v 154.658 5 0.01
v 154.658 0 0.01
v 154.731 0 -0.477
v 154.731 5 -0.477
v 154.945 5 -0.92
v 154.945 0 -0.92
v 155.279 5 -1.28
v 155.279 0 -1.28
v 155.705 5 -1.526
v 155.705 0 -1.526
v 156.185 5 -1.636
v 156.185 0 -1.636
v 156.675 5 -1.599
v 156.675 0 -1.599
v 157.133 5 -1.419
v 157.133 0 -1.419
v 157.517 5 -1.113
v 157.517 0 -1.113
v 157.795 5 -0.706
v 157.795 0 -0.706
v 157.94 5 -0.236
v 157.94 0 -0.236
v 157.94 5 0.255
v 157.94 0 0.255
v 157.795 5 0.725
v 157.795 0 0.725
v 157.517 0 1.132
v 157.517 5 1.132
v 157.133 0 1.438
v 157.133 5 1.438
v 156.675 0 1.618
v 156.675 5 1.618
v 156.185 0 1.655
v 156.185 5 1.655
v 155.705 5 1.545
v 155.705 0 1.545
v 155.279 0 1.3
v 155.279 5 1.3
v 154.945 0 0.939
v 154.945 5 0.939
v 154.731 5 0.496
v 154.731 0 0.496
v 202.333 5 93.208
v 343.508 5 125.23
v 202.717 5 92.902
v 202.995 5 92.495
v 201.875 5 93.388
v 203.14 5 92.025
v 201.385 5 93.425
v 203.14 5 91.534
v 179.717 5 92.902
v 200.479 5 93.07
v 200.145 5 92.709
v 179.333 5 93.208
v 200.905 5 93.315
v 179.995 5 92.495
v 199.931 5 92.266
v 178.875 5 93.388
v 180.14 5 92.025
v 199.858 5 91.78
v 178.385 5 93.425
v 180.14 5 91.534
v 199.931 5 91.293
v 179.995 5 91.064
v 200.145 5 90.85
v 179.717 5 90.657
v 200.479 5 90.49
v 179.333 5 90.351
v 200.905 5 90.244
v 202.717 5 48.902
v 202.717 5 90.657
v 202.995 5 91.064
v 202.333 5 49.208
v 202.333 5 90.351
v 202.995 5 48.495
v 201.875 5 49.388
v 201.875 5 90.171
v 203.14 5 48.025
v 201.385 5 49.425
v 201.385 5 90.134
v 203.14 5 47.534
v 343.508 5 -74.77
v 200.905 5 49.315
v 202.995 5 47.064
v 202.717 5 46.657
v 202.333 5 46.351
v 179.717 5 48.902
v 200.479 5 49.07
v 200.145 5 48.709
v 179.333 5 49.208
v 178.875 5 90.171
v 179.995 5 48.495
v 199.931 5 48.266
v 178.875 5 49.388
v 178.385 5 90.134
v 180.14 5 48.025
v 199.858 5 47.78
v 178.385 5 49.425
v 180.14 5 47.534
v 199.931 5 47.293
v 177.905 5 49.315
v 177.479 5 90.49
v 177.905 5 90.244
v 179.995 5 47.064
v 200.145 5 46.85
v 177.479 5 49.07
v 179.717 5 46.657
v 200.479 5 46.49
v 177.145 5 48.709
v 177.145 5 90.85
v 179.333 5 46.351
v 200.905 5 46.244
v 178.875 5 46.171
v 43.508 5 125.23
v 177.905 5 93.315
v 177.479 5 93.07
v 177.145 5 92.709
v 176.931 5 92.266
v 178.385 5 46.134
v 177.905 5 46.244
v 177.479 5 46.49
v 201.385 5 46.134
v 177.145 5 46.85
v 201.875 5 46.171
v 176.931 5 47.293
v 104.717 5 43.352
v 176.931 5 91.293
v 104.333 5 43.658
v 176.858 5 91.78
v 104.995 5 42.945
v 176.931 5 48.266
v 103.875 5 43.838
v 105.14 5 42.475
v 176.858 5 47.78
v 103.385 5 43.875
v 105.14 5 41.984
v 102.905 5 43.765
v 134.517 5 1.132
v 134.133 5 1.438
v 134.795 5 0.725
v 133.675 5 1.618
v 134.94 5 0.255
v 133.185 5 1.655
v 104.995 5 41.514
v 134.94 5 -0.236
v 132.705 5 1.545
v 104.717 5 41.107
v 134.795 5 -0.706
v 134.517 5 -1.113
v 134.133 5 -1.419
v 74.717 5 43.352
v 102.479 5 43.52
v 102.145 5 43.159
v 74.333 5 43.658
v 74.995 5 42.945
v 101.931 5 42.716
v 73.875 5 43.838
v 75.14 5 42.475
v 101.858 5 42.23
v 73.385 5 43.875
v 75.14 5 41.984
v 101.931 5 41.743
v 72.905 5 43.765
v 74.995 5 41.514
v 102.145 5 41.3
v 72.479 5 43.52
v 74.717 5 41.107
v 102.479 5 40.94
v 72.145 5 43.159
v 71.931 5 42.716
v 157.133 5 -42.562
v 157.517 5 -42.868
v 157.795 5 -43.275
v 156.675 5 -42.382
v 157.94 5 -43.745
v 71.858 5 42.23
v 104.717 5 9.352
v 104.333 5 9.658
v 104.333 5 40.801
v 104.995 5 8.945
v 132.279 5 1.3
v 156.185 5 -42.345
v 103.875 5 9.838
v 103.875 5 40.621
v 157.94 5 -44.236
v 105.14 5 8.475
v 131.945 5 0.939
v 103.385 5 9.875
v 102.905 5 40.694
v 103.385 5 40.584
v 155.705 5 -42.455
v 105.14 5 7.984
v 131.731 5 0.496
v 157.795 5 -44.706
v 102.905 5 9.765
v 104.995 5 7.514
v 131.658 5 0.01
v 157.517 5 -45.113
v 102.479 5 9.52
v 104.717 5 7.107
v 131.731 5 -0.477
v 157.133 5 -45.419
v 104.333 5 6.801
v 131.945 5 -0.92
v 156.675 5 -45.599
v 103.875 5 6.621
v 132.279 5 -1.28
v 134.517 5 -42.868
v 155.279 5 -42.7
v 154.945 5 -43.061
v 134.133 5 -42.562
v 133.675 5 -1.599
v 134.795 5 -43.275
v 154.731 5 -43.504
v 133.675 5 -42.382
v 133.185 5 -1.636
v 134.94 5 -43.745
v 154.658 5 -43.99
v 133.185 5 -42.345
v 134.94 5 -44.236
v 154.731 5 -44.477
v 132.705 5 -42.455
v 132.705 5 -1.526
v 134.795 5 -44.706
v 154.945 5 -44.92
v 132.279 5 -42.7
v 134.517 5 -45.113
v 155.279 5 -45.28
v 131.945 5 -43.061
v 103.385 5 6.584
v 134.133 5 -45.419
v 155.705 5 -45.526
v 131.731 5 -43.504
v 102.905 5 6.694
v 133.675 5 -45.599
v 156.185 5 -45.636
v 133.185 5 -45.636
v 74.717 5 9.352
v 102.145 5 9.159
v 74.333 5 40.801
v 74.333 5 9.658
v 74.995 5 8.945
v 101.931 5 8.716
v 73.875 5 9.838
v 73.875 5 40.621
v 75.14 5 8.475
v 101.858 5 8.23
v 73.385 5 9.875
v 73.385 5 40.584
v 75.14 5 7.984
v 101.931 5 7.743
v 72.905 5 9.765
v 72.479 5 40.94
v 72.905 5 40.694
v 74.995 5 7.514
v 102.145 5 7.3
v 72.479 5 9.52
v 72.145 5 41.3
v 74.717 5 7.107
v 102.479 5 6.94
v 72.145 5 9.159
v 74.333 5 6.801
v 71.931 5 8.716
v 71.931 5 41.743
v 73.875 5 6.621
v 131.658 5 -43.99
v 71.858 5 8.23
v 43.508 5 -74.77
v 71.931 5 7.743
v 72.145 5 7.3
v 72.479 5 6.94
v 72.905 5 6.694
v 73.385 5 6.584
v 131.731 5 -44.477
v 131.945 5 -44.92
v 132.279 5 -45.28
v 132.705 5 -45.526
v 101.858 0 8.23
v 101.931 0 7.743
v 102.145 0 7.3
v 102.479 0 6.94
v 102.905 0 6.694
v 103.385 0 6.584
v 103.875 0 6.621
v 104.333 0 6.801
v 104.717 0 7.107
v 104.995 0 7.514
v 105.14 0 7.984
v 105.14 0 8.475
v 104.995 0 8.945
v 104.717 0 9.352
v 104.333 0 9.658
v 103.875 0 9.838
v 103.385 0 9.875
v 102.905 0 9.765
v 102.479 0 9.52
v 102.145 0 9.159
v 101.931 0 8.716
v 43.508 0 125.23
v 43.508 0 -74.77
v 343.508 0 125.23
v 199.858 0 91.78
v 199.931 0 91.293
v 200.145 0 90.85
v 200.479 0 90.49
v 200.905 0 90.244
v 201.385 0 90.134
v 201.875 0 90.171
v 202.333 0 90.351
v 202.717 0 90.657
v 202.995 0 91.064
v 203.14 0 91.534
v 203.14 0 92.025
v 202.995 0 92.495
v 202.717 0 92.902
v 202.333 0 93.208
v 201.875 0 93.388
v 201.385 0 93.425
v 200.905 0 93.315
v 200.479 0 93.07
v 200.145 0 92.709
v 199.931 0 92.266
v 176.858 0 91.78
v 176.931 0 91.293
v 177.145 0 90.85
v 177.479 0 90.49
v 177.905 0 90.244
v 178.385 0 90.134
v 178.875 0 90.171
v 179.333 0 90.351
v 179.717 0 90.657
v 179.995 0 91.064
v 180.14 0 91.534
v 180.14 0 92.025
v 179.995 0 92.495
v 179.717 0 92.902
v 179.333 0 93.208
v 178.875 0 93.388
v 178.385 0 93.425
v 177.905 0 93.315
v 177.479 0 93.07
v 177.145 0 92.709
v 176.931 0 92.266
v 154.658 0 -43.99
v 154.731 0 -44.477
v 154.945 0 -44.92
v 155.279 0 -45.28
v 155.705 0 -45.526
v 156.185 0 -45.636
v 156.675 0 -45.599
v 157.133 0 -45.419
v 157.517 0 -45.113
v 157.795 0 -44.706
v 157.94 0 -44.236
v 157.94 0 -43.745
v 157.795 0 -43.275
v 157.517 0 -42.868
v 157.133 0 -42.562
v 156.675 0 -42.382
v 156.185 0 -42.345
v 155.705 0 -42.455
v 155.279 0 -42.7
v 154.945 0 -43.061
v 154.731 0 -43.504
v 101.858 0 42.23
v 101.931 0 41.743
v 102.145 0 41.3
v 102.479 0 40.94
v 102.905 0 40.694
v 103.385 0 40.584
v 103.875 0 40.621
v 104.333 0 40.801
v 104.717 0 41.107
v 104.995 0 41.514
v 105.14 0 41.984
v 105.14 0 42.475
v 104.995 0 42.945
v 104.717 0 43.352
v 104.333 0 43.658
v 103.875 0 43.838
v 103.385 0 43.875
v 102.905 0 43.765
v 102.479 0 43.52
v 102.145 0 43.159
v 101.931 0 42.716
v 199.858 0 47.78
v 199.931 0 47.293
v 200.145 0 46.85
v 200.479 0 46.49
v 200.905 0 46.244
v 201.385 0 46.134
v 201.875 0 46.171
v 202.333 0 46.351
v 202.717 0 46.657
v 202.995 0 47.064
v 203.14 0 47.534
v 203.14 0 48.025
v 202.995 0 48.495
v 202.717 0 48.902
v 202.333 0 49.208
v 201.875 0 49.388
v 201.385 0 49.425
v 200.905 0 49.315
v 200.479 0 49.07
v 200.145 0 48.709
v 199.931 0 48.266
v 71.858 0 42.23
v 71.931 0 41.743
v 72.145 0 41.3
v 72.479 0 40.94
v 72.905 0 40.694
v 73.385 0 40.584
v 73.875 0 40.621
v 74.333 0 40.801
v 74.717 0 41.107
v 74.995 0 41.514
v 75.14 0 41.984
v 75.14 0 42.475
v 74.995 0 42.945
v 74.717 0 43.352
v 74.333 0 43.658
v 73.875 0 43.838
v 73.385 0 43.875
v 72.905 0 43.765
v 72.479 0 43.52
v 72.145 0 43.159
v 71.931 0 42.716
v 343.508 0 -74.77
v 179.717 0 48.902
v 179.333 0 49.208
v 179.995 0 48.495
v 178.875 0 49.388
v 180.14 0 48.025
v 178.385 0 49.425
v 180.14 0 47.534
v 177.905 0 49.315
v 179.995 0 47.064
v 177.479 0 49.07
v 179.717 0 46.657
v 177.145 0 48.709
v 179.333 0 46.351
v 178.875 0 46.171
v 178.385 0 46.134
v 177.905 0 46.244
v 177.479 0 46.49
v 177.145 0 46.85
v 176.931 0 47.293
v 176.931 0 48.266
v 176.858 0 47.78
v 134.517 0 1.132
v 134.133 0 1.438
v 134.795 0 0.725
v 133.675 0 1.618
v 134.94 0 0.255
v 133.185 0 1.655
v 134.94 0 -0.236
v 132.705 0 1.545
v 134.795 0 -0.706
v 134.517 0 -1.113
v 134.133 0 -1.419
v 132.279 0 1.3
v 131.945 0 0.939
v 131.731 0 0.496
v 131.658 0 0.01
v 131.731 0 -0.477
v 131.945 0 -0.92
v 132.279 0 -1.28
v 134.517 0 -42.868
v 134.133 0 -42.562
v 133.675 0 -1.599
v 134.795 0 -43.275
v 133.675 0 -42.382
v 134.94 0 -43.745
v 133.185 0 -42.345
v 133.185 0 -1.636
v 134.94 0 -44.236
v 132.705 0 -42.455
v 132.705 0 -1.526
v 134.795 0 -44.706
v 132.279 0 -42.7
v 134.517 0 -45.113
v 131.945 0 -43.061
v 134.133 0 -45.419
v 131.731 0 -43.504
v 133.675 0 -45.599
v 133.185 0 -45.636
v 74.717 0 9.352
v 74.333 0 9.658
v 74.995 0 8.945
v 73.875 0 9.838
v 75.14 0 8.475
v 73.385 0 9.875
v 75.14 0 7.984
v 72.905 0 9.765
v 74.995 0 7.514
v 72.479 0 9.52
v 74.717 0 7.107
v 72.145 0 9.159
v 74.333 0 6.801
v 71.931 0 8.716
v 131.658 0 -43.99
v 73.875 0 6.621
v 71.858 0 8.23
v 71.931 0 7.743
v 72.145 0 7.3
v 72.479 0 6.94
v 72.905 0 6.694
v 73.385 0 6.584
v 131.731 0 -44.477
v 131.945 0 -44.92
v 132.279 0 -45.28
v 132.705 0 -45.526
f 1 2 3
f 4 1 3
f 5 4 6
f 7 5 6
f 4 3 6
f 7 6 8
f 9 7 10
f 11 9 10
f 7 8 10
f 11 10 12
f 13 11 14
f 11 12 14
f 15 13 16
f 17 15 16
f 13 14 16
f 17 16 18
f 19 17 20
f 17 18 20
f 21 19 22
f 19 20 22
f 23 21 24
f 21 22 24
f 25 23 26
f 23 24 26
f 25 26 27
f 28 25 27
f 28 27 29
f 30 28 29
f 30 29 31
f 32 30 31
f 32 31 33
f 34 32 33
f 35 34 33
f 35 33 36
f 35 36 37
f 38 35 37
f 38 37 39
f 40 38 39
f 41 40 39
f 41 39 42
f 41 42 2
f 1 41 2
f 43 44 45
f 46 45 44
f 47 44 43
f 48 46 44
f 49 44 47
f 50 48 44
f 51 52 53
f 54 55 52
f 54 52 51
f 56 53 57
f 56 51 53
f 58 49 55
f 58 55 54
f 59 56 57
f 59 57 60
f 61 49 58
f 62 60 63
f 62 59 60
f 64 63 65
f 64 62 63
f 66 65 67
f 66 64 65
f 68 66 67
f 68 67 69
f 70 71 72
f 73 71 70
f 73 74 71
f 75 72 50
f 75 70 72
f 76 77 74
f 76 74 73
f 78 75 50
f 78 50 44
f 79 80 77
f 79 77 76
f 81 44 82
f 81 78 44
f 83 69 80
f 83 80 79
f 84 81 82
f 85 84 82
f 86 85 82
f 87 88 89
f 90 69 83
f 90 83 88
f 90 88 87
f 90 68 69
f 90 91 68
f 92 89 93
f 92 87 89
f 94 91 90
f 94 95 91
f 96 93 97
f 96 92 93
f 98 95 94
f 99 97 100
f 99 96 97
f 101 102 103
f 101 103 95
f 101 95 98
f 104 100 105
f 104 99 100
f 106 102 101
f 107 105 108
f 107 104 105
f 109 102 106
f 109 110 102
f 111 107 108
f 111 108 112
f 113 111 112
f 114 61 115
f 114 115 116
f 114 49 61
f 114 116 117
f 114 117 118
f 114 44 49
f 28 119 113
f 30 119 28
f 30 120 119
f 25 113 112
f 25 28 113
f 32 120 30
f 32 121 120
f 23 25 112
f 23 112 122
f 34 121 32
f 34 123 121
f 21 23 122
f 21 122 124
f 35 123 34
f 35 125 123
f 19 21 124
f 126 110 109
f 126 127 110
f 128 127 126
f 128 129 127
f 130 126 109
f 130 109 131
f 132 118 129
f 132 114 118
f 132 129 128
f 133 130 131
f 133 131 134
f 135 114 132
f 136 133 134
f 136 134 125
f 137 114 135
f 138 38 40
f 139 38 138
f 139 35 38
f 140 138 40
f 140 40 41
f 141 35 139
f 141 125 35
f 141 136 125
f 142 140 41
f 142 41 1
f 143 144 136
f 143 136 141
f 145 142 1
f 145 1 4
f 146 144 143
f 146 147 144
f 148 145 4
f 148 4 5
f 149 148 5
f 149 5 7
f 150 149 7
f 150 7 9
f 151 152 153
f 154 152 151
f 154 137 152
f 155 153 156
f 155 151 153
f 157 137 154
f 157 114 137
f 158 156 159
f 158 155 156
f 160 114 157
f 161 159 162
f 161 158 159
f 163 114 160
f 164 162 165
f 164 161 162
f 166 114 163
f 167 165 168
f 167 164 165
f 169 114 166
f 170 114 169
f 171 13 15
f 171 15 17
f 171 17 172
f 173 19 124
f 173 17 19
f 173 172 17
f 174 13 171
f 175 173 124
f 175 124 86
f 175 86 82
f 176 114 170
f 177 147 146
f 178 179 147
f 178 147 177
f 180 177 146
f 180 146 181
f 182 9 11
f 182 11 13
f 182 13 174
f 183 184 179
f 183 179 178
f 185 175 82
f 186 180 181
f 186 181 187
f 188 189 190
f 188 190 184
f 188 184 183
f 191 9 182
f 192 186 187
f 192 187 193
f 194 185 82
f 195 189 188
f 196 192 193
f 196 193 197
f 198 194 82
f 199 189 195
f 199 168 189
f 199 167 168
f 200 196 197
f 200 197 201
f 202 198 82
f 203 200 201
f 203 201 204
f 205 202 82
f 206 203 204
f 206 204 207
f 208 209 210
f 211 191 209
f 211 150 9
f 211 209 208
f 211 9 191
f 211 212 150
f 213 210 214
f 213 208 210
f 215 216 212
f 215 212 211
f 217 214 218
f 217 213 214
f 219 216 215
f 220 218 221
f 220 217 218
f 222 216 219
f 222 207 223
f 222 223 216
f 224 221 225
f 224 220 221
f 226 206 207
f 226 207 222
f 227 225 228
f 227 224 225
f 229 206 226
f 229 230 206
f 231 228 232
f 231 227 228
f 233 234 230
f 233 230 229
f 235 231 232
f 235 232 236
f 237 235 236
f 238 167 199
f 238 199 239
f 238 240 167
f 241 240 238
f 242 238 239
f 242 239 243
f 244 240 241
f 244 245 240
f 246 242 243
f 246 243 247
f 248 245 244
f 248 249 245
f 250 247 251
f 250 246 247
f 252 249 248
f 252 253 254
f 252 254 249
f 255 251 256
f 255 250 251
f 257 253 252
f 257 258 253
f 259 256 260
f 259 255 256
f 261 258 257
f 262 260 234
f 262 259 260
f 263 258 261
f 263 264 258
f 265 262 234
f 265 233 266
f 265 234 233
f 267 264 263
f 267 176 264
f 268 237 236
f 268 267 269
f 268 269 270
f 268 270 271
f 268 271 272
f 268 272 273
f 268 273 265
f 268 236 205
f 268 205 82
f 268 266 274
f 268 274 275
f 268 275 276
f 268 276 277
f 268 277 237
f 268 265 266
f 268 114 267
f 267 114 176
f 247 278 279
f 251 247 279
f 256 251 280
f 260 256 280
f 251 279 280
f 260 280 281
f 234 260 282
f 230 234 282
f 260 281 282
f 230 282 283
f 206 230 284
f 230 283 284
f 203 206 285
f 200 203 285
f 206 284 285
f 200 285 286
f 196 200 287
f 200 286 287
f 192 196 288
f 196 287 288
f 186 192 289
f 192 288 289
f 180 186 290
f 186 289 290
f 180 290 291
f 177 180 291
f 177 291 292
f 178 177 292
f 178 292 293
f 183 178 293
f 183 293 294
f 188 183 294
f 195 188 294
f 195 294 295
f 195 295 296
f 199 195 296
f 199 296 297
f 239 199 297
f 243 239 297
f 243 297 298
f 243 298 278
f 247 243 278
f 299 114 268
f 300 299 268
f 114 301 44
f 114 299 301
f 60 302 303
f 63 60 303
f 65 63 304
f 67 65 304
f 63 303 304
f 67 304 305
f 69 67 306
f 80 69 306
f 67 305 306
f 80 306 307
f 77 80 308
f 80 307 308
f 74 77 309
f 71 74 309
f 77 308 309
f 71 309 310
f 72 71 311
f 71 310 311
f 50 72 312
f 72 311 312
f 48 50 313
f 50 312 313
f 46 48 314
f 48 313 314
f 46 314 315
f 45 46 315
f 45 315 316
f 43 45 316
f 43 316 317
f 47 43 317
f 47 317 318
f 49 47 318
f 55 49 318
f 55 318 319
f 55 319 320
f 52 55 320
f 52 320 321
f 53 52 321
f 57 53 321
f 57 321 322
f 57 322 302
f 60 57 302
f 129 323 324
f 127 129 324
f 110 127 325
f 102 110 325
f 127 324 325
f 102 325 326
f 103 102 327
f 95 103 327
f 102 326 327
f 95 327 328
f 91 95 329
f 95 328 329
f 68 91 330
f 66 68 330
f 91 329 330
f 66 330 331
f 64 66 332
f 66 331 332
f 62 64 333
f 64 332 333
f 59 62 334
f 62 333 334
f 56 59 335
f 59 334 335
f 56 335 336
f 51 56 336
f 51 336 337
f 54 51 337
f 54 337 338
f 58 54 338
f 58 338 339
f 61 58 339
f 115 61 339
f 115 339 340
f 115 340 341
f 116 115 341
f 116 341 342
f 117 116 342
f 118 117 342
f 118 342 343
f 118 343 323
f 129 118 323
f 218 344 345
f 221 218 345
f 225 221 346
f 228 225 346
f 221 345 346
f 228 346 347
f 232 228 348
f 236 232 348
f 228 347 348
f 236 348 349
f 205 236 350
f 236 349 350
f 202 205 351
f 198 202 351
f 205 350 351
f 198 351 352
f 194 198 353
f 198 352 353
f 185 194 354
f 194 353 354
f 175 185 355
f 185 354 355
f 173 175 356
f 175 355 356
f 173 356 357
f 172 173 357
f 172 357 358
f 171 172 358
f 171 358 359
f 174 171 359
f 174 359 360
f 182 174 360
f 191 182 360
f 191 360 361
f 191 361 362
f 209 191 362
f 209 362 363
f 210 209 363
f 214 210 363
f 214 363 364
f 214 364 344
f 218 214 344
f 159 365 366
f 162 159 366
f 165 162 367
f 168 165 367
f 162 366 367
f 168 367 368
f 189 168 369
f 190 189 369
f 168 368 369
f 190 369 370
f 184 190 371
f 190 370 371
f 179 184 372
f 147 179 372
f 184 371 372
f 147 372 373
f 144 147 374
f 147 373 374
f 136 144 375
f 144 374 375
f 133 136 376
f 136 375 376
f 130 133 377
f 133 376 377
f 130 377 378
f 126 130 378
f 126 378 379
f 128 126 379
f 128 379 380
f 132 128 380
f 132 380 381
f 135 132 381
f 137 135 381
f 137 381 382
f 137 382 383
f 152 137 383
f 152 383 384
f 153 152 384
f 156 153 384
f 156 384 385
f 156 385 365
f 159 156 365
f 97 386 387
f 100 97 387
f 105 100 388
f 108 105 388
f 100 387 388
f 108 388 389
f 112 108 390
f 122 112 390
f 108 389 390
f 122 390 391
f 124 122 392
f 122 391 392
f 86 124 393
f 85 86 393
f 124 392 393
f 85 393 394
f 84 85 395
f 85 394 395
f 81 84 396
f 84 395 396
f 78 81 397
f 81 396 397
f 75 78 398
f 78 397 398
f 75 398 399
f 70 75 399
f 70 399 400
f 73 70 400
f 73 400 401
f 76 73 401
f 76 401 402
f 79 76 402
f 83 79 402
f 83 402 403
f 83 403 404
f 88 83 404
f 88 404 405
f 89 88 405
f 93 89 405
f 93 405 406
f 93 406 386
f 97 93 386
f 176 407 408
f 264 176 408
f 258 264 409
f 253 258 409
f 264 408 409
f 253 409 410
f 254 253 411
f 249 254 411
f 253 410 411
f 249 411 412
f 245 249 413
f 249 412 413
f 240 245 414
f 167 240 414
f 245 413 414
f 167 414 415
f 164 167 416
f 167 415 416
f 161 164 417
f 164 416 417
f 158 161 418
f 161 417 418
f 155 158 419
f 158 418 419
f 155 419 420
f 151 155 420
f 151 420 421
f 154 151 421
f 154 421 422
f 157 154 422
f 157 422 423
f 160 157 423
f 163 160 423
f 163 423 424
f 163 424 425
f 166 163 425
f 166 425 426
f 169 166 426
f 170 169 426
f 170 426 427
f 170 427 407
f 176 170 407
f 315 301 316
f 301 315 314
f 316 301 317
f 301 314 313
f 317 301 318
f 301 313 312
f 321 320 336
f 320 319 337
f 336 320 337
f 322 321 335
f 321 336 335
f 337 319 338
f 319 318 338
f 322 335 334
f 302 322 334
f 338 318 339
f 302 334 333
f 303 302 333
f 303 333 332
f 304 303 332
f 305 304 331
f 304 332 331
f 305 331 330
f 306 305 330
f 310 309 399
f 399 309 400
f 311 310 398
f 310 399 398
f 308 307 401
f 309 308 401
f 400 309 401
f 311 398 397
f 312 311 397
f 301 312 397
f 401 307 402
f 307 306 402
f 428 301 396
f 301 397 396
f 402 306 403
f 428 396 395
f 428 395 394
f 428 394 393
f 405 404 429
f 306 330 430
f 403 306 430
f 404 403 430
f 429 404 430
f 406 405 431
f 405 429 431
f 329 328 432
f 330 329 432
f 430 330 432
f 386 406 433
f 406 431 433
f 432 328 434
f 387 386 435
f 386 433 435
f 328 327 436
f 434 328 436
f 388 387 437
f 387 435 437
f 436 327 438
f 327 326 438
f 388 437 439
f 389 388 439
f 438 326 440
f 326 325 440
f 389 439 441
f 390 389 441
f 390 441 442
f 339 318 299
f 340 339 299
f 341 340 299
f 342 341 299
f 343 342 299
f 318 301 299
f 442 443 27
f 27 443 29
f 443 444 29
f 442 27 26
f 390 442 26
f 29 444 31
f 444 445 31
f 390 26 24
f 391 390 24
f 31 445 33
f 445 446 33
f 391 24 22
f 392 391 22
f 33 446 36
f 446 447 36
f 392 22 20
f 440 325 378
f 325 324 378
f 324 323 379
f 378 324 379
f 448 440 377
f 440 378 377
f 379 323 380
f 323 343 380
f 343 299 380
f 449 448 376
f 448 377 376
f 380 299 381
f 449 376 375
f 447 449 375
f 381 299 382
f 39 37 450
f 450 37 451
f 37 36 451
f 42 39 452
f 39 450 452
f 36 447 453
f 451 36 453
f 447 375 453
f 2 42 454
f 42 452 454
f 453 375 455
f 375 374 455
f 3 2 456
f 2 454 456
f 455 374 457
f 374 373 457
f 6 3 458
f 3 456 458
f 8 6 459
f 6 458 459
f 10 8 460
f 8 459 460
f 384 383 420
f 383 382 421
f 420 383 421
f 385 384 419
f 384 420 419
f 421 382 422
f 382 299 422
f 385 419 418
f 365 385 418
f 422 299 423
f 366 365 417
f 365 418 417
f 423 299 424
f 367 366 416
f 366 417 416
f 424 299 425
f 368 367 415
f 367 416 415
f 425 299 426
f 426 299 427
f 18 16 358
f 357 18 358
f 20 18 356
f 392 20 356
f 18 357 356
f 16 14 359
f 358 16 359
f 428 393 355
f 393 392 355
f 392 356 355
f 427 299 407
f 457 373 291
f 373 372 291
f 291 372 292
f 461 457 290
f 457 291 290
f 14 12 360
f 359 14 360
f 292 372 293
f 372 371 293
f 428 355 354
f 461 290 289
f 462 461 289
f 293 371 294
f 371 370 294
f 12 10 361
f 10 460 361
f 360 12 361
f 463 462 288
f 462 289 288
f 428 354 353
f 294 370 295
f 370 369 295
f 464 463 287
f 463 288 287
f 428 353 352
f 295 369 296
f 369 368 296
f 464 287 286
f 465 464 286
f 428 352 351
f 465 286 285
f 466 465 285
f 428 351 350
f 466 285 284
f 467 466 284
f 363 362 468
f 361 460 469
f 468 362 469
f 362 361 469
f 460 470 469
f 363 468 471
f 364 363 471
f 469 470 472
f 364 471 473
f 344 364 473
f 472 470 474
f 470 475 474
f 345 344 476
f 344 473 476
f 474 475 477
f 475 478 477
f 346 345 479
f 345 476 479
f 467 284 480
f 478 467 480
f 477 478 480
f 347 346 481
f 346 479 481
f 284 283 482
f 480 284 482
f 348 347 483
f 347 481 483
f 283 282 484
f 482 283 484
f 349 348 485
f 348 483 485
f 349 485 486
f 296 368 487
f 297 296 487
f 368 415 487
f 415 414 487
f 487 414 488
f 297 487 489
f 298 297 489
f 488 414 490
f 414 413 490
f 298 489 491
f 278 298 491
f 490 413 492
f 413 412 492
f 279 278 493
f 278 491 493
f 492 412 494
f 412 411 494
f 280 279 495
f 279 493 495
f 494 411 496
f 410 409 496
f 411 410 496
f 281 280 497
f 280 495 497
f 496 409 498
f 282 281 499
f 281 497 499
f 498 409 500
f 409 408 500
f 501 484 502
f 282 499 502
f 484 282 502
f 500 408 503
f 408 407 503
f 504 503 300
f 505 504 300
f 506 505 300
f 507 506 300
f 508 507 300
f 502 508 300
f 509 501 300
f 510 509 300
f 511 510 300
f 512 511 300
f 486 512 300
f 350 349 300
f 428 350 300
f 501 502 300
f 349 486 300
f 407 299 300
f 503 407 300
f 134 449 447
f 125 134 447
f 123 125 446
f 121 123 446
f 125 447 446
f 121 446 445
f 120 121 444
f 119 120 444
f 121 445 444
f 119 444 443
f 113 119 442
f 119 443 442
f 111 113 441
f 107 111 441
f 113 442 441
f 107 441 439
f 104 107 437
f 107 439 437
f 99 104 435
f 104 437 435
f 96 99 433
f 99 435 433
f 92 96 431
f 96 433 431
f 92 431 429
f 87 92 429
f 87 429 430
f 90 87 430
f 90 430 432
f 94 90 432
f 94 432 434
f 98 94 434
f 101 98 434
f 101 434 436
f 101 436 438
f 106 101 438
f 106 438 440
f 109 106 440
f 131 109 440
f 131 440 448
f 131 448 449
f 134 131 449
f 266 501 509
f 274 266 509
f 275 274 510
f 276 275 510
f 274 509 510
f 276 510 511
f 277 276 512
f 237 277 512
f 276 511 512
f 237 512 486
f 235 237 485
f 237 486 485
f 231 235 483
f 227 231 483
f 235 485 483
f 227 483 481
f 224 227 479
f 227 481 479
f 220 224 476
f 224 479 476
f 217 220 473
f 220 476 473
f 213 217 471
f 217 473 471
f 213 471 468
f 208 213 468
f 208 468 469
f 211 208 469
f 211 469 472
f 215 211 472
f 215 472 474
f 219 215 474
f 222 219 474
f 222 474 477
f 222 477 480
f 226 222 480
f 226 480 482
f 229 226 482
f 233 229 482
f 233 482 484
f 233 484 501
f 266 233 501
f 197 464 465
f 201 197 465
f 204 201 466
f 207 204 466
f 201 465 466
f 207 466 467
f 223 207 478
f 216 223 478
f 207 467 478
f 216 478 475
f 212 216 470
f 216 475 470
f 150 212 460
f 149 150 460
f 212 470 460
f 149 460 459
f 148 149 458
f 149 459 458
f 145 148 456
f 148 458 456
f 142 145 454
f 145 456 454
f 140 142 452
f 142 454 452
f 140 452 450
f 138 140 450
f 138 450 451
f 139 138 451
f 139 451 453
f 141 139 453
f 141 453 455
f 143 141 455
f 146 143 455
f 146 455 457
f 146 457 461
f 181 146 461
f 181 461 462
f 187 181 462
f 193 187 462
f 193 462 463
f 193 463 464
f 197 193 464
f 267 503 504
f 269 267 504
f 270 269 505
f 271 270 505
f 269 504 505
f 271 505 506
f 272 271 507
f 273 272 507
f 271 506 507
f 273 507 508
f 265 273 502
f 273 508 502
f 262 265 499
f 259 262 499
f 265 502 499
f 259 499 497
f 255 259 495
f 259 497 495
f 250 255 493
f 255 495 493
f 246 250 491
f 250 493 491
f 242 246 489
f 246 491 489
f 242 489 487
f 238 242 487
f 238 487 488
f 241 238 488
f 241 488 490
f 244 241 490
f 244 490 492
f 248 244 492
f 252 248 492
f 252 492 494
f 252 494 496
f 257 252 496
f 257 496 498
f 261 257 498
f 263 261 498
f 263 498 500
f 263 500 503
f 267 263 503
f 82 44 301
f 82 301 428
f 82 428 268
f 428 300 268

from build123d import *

# Parameters (mm, degrees)
SKETCH_2_W               = 240.549430728
SKETCH_2_H               = 149.540933388
EXTRUDE_1_DEPTH          = 5
SKETCH_6_W               = 93.246571425
SKETCH_6_H               = 149.540933388
EXTRUDE_4_DEPTH          = 5
SKETCH_8_W               = 274.716709757
SKETCH_8_H               = 58.51354913
EXTRUDE_6_DEPTH          = 5
CUT_EXTRUDE_2_DEPTH      = 252.755772101
CUT_EXTRUDE_2_DEPTH_BACK = 252.755772101
SKETCH_9_W               = 59.079292396
SKETCH_9_H               = 149.540933388
SKETCH_10_W              = 104.703380117
SKETCH_10_H              = 208.054482518
CUT_EXTRUDE_3_DEPTH      = 10
SKETCH_12_W              = 200
SKETCH_12_H              = 200
EXTRUDE_7_DEPTH          = 5
SKETCH_13_OUTSIDE_W      = 259.728
SKETCH_13_OUTSIDE_H      = 267.782
SKETCH_13_OUTSIDE_W_2    = 200
SKETCH_13_OUTSIDE_H_2    = 200
CUT_EXTRUDE_4_DEPTH      = 278.64321362
EXTRUDE_START            = -75
SKETCH_18_R              = 5.25
EXTRUDE_9_DEPTH          = 10
EXTRUDE_START_2          = -46
EXTRUDE_10_DEPTH         = 15
EXTRUDE_START_3          = -91.2
EXTRUDE_11_DEPTH         = 15
EXTRUDE_12_REACH         = 307.894
SKETCH_20_R              = 5.25
SKETCH_26_W              = 200
SKETCH_26_H              = 5
EXTRUDE_13_DEPTH         = 100
SKETCH_27_W              = 200
SKETCH_27_H              = 5
CUT_EXTRUDE_5_DEPTH      = 30
EXTRUDE_14_DEPTH         = 10
SKETCH_29_W              = 60
SKETCH_29_H              = 9
EXTRUDE_15_DEPTH         = 10
HOLE_WIZARD_M4_1_D       = 3.3
HOLE_WIZARD_M4_2_D       = 3.3
HOLE_WIZARD_M4_3_D       = 3.3
EXTRUDE_16_DEPTH         = 10
SKETCH_37_W              = 60
SKETCH_37_H              = 9
EXTRUDE_17_DEPTH         = 10
HOLE_WIZARD_M4_4_D       = 3.3
EXTRUDE_START_4          = -3.5
SKETCH_40_R              = 5.25
SKETCH_40_R_2            = 3.25
EXTRUDE_18_DEPTH         = 46.5
CUT_EXTRUDE_START        = -3.5
SKETCH_41_R              = 5.25
SKETCH_41_R_2            = 3.25
CUT_EXTRUDE_6_DEPTH      = 3.5
HOLE_WIZARD_M4_5_D       = 3.3
SKETCH_44_W              = 237.08727287
SKETCH_44_H              = 162.445626336
CUT_EXTRUDE_7_DEPTH      = 400.170489639
SKETCH_45_W              = 200
SKETCH_45_H              = 5
EXTRUDE_19_DEPTH         = 30


with BuildPart() as part:
    # 草图2 → 凸台-拉伸1 (new body)
    with BuildSketch(Plane(origin=(0, 0, 0), x_dir=(1, 0, 0), z_dir=(0, 1, 0))):
        Rectangle(SKETCH_2_W, SKETCH_2_H)
    extrude(amount=EXTRUDE_1_DEPTH)

    # 草图6 → 凸台-拉伸4 (add)
    with BuildSketch(Plane(origin=(0, 5, 0), x_dir=(1, 0, 0), z_dir=(0, 1, 0))):
        with Locations((166.898001077, 0)):
            Rectangle(SKETCH_6_W, SKETCH_6_H)
    extrude(amount=-EXTRUDE_4_DEPTH)

    # 草图8 → 凸台-拉伸6 (add)
    with BuildSketch(Plane(origin=(0, 5, 0), x_dir=(1, 0, 0), z_dir=(0, 1, 0))):
        with Locations((76.162931911, -104.027241259)):
            Rectangle(SKETCH_8_W, SKETCH_8_H)
    extrude(amount=-EXTRUDE_6_DEPTH)

    # 草图9 → 切除-拉伸2 (cut, two sides: drawn at the far end of the back side and taken through both)
    with BuildSketch(Plane(origin=(0, 5, 0), x_dir=(1, 0, 0), z_dir=(0, 1, 0)).offset(-CUT_EXTRUDE_2_DEPTH_BACK)):
        with Locations((-90.735069166, 0)):
            Rectangle(SKETCH_9_W, SKETCH_9_H)
    extrude(amount=CUT_EXTRUDE_2_DEPTH + CUT_EXTRUDE_2_DEPTH_BACK, mode=Mode.SUBTRACT)

    # 草图10 → 切除-拉伸3 (cut)
    with BuildSketch(Plane(origin=(0, 5, 0), x_dir=(1, 0, 0), z_dir=(0, 1, 0))):
        with Locations((-8.84373291, -29.256774565)):
            Rectangle(SKETCH_10_W, SKETCH_10_H)
    extrude(amount=-CUT_EXTRUDE_3_DEPTH, mode=Mode.SUBTRACT)

    # 草图12 → 凸台-拉伸7 (add)
    with BuildSketch(Plane(origin=(0, 5, 0), x_dir=(1, 0, 0), z_dir=(0, 1, 0))):
        with Locations((143.507957149, -25.229533306)):
            Rectangle(SKETCH_12_W, SKETCH_12_H)
    extrude(amount=-EXTRUDE_7_DEPTH)

    # 草图13 outside → 切除-拉伸4 (cut, through all)
    with BuildSketch(Plane(origin=(0, 5, 0), x_dir=(1, 0, 0), z_dir=(0, 1, 0))):
        with Locations((143.508, -29.257)):
            Rectangle(SKETCH_13_OUTSIDE_W, SKETCH_13_OUTSIDE_H)
        with Locations((143.507957149, -25.229533306)):
            Rectangle(SKETCH_13_OUTSIDE_W_2, SKETCH_13_OUTSIDE_H_2, mode=Mode.SUBTRACT)
    extrude(amount=-CUT_EXTRUDE_4_DEPTH, mode=Mode.SUBTRACT)

    # 草图18 → 凸台-拉伸9 (add)
    with BuildSketch(Plane.XY.offset(125.229533306).offset(EXTRUDE_START)):
        with BuildLine():
            Line((95.507957149, 14), (95.507957149, 125))
            ThreePointArc((95.507957149, 125), (88.507957149, 132), (81.507957149, 125))
            Line((81.507957149, 125), (81.507957149, 14))
            Line((81.507957149, 14), (68.507957149, 14))
            Line((68.507957149, 14), (68.507957149, 5))
            Line((68.507957149, 5), (108.507957149, 5))
            Line((108.507957149, 5), (108.507957149, 14))
            Line((108.507957149, 14), (95.507957149, 14))
        make_face()
        with Locations((88.507957149, 125)):
            Circle(SKETCH_18_R, mode=Mode.SUBTRACT)
    extrude_9 = extrude(amount=-EXTRUDE_9_DEPTH)

    # 镜向1: 凸台-拉伸9 across plane
    add(extrude_9.mirror(Plane.XY.offset(25.229533306)))

    # 草图16 → 凸台-拉伸10 (add)
    with BuildSketch(Plane(origin=(243.507957149, 0, 0), x_dir=(0, 0, -1), z_dir=(1, 0, 0)).offset(EXTRUDE_START_2)):
        with BuildLine():
            Line((-53.779533306, 14), (-53.779533306, 145.085631965))
            Line((-53.779533306, 145.085631965), (-67.779533306, 145.085631965))
            Line((-67.779533306, 145.085631965), (-67.779533306, 139.085631965))
            ThreePointArc((-67.779533306, 139.085631965), (-69.779533306, 114.75), (-71.779533306, 139.085631965))
            Line((-71.779533306, 139.085631965), (-71.779533306, 145.085631965))
            Line((-71.779533306, 145.085631965), (-85.779533306, 145.085631965))
            Line((-85.779533306, 145.085631965), (-85.779533306, 14))
            Line((-85.779533306, 14), (-99.779533306, 14))
            Line((-99.779533306, 14), (-99.779533306, 5))
            Line((-99.779533306, 5), (-39.779533306, 5))
            Line((-39.779533306, 5), (-39.779533306, 14))
            Line((-39.779533306, 14), (-53.779533306, 14))
        make_face()
    extrude(amount=-EXTRUDE_10_DEPTH)

    # 草图19 → 凸台-拉伸11 (add)
    with BuildSketch(Plane(origin=(243.507957149, 0, 0), x_dir=(0, 0, -1), z_dir=(1, 0, 0)).offset(EXTRUDE_START_3)):
        with BuildLine():
            Line((37.990466694, 14), (37.990466694, 144.933566106))
            Line((37.990466694, 144.933566106), (23.990466694, 144.933566106))
            Line((23.990466694, 144.933566106), (23.990466694, 138.933566106))
            ThreePointArc((23.990466694, 138.933566106), (21.990466694, 114.9), (19.990466694, 138.933566106))
            Line((19.990466694, 138.933566106), (19.990466694, 144.933566106))
            Line((19.990466694, 144.933566106), (5.990466694, 144.933566106))
            Line((5.990466694, 144.933566106), (5.990466694, 14))
            Line((5.990466694, 14), (-8.009533306, 14))
            Line((-8.009533306, 14), (-8.009533306, 5))
            Line((-8.009533306, 5), (51.990466694, 5))
            Line((51.990466694, 5), (51.990466694, 14))
            Line((51.990466694, 14), (37.990466694, 14))
        make_face()
    extrude(amount=-EXTRUDE_11_DEPTH)

    # 草图20 → 凸台-拉伸12 (add, up to next)
    with BuildSketch(Plane(origin=(0, 0, 40.229533306), x_dir=(-1, 0, 0), z_dir=(0, 0, -1)), mode=Mode.PRIVATE) as extrude_12_sk1:
        with BuildLine():
            Line((-108.507957149, 5), (-68.507957149, 5))
            Line((-68.507957149, 5), (-68.507957149, 14))
            Line((-68.507957149, 14), (-81.507957149, 14))
            Line((-81.507957149, 14), (-81.507957149, 125))
            ThreePointArc((-81.507957149, 125), (-88.507957149, 132), (-95.507957149, 125))
            Line((-95.507957149, 125), (-95.507957149, 14))
            Line((-95.507957149, 14), (-108.507957149, 14))
            Line((-108.507957149, 14), (-108.507957149, 5))
        make_face()
        with Locations(Location((-88.507957149, 125, 0), (0, 0, 180))):
            Circle(SKETCH_20_R, mode=Mode.SUBTRACT)
    extrude_12_tool1 = extrude(extrude_12_sk1.sketch, amount=EXTRUDE_12_REACH, mode=Mode.PRIVATE) - part.part
    add(extrude_12_tool1.solids().sort_by_distance((88.507957, 57.997401, 40.229533))[0])

    # 草图26 → 凸台-拉伸13 (add)
    with BuildSketch(Plane(origin=(243.507957149, 0, 0), x_dir=(0, 0, -1), z_dir=(1, 0, 0))):
        with Locations((-25.229533306, 2.5)):
            Rectangle(SKETCH_26_W, SKETCH_26_H)
    extrude(amount=EXTRUDE_13_DEPTH)

    # 草图27 → 切除-拉伸5 (cut)
    with BuildSketch(Plane(origin=(343.507957149, 0, 0), x_dir=(0, 0, -1), z_dir=(1, 0, 0))):
        with Locations((-25.229533306, 2.5)):
            Rectangle(SKETCH_27_W, SKETCH_27_H)
    extrude(amount=-CUT_EXTRUDE_5_DEPTH, mode=Mode.SUBTRACT)

    # 草图28 → 凸台-拉伸14 (add)
    with BuildSketch(Plane(origin=(197.507957149, 0, 0), x_dir=(0, 0, -1), z_dir=(1, 0, 0))):
        Polygon((-85.779533306, 14), (-53.779533306, 14), (-39.779533306, 14), (-39.779533306, 5), (-99.779533306, 5), (-99.779533306, 14), align=None)
    extrude(amount=EXTRUDE_14_DEPTH)

    # 草图29 → 凸台-拉伸15 (add)
    with BuildSketch(Plane.ZY.offset(-182.507957149)):
        with Locations((69.779533306, 9.5)):
            Rectangle(SKETCH_29_W, SKETCH_29_H)
    extrude(amount=EXTRUDE_15_DEPTH)

    # M4 螺纹孔1 (through all)
    with Locations(Plane(origin=(0, 14, 0), x_dir=(1, 0, 0), z_dir=(0, 1, 0))):
        with Locations((178.507957149, -47.779533306), (201.507957149, -47.779533306), (201.507957149, -91.779533306), (178.507957149, -91.779533306)):
            Hole(HOLE_WIZARD_M4_1_D / 2)

    # M4 螺纹孔2 (through all)
    with Locations(Plane.XY.offset(85.779533306)):
        with Locations((190.007957149, 141.085631965)):
            Hole(HOLE_WIZARD_M4_2_D / 2)

    # M4 螺纹孔3 (through all)
    with Locations(Plane.XY.offset(-5.990466694)):
        with Locations((144.807957149, 140.933566106)):
            Hole(HOLE_WIZARD_M4_3_D / 2)

    # 草图36 → 凸台-拉伸16 (add)
    with BuildSketch(Plane(origin=(152.307957149, 0, 0), x_dir=(0, 0, -1), z_dir=(1, 0, 0))):
        Polygon((5.990466694, 14), (37.990466694, 14), (51.990466694, 14), (51.990466694, 5), (-8.009533306, 5), (-8.009533306, 14), align=None)
    extrude(amount=EXTRUDE_16_DEPTH)

    # 草图37 → 凸台-拉伸17 (add)
    with BuildSketch(Plane.ZY.offset(-137.307957149)):
        with Locations((-21.990466694, 9.5)):
            Rectangle(SKETCH_37_W, SKETCH_37_H)
    extrude(amount=EXTRUDE_17_DEPTH)

    # M4 螺纹孔4 (through all)
    with Locations(Plane(origin=(0, 14, 0), x_dir=(1, 0, 0), z_dir=(0, 1, 0))):
        with Locations((133.307957149, 43.990466694), (156.307957149, 43.990466694), (156.307957149, -0.009533306), (133.307957149, -0.009533306)):
            Hole(HOLE_WIZARD_M4_4_D / 2)

    # 草图40 → 凸台-拉伸18 (add)
    with BuildSketch(Plane.XY.offset(50.229533306).offset(EXTRUDE_START_4)):
        with Locations((88.507957149, 125)):
            Circle(SKETCH_40_R)
        with Locations((88.507957149, 125)):
            Circle(SKETCH_40_R_2, mode=Mode.SUBTRACT)
    extrude(amount=-EXTRUDE_18_DEPTH)

    # 草图41 → 切除-拉伸6 (cut)
    with BuildSketch(Plane(origin=(0, 0, 0.229533306), x_dir=(-1, 0, 0), z_dir=(0, 0, -1)).offset(CUT_EXTRUDE_START)):
        with Locations(Location((-88.507957149, 125, 0), (0, 0, 180))):
            Circle(SKETCH_41_R)
        with Locations(Location((-88.507957149, 125, 0), (0, 0, 180))):
            Circle(SKETCH_41_R_2, mode=Mode.SUBTRACT)
    extrude(amount=CUT_EXTRUDE_6_DEPTH, mode=Mode.SUBTRACT)

    # M4 螺纹孔5 (through all)
    with Locations(Plane(origin=(0, 14, 0), x_dir=(1, 0, 0), z_dir=(0, 1, 0))):
        with Locations((73.507957149, -8.229533306), (103.507957149, -8.229533306), (103.507957149, -42.229533306), (73.507957149, -42.229533306)):
            Hole(HOLE_WIZARD_M4_5_D / 2)

    # 草图44 → 切除-拉伸7 (cut, through all)
    with BuildSketch(Plane.XY.offset(125.229533306)):
        with Locations((150.88727092, 86.222813168)):
            Rectangle(SKETCH_44_W, SKETCH_44_H)
    extrude(amount=-CUT_EXTRUDE_7_DEPTH, mode=Mode.SUBTRACT)

    # 草图45 → 凸台-拉伸19 (add)
    with BuildSketch(Plane(origin=(313.507957149, 0, 0), x_dir=(0, 0, -1), z_dir=(1, 0, 0))):
        with Locations((-25.229533306, 2.5)):
            Rectangle(SKETCH_45_W, SKETCH_45_H)
    extrude(amount=EXTRUDE_19_DEPTH)


solid = part.part
